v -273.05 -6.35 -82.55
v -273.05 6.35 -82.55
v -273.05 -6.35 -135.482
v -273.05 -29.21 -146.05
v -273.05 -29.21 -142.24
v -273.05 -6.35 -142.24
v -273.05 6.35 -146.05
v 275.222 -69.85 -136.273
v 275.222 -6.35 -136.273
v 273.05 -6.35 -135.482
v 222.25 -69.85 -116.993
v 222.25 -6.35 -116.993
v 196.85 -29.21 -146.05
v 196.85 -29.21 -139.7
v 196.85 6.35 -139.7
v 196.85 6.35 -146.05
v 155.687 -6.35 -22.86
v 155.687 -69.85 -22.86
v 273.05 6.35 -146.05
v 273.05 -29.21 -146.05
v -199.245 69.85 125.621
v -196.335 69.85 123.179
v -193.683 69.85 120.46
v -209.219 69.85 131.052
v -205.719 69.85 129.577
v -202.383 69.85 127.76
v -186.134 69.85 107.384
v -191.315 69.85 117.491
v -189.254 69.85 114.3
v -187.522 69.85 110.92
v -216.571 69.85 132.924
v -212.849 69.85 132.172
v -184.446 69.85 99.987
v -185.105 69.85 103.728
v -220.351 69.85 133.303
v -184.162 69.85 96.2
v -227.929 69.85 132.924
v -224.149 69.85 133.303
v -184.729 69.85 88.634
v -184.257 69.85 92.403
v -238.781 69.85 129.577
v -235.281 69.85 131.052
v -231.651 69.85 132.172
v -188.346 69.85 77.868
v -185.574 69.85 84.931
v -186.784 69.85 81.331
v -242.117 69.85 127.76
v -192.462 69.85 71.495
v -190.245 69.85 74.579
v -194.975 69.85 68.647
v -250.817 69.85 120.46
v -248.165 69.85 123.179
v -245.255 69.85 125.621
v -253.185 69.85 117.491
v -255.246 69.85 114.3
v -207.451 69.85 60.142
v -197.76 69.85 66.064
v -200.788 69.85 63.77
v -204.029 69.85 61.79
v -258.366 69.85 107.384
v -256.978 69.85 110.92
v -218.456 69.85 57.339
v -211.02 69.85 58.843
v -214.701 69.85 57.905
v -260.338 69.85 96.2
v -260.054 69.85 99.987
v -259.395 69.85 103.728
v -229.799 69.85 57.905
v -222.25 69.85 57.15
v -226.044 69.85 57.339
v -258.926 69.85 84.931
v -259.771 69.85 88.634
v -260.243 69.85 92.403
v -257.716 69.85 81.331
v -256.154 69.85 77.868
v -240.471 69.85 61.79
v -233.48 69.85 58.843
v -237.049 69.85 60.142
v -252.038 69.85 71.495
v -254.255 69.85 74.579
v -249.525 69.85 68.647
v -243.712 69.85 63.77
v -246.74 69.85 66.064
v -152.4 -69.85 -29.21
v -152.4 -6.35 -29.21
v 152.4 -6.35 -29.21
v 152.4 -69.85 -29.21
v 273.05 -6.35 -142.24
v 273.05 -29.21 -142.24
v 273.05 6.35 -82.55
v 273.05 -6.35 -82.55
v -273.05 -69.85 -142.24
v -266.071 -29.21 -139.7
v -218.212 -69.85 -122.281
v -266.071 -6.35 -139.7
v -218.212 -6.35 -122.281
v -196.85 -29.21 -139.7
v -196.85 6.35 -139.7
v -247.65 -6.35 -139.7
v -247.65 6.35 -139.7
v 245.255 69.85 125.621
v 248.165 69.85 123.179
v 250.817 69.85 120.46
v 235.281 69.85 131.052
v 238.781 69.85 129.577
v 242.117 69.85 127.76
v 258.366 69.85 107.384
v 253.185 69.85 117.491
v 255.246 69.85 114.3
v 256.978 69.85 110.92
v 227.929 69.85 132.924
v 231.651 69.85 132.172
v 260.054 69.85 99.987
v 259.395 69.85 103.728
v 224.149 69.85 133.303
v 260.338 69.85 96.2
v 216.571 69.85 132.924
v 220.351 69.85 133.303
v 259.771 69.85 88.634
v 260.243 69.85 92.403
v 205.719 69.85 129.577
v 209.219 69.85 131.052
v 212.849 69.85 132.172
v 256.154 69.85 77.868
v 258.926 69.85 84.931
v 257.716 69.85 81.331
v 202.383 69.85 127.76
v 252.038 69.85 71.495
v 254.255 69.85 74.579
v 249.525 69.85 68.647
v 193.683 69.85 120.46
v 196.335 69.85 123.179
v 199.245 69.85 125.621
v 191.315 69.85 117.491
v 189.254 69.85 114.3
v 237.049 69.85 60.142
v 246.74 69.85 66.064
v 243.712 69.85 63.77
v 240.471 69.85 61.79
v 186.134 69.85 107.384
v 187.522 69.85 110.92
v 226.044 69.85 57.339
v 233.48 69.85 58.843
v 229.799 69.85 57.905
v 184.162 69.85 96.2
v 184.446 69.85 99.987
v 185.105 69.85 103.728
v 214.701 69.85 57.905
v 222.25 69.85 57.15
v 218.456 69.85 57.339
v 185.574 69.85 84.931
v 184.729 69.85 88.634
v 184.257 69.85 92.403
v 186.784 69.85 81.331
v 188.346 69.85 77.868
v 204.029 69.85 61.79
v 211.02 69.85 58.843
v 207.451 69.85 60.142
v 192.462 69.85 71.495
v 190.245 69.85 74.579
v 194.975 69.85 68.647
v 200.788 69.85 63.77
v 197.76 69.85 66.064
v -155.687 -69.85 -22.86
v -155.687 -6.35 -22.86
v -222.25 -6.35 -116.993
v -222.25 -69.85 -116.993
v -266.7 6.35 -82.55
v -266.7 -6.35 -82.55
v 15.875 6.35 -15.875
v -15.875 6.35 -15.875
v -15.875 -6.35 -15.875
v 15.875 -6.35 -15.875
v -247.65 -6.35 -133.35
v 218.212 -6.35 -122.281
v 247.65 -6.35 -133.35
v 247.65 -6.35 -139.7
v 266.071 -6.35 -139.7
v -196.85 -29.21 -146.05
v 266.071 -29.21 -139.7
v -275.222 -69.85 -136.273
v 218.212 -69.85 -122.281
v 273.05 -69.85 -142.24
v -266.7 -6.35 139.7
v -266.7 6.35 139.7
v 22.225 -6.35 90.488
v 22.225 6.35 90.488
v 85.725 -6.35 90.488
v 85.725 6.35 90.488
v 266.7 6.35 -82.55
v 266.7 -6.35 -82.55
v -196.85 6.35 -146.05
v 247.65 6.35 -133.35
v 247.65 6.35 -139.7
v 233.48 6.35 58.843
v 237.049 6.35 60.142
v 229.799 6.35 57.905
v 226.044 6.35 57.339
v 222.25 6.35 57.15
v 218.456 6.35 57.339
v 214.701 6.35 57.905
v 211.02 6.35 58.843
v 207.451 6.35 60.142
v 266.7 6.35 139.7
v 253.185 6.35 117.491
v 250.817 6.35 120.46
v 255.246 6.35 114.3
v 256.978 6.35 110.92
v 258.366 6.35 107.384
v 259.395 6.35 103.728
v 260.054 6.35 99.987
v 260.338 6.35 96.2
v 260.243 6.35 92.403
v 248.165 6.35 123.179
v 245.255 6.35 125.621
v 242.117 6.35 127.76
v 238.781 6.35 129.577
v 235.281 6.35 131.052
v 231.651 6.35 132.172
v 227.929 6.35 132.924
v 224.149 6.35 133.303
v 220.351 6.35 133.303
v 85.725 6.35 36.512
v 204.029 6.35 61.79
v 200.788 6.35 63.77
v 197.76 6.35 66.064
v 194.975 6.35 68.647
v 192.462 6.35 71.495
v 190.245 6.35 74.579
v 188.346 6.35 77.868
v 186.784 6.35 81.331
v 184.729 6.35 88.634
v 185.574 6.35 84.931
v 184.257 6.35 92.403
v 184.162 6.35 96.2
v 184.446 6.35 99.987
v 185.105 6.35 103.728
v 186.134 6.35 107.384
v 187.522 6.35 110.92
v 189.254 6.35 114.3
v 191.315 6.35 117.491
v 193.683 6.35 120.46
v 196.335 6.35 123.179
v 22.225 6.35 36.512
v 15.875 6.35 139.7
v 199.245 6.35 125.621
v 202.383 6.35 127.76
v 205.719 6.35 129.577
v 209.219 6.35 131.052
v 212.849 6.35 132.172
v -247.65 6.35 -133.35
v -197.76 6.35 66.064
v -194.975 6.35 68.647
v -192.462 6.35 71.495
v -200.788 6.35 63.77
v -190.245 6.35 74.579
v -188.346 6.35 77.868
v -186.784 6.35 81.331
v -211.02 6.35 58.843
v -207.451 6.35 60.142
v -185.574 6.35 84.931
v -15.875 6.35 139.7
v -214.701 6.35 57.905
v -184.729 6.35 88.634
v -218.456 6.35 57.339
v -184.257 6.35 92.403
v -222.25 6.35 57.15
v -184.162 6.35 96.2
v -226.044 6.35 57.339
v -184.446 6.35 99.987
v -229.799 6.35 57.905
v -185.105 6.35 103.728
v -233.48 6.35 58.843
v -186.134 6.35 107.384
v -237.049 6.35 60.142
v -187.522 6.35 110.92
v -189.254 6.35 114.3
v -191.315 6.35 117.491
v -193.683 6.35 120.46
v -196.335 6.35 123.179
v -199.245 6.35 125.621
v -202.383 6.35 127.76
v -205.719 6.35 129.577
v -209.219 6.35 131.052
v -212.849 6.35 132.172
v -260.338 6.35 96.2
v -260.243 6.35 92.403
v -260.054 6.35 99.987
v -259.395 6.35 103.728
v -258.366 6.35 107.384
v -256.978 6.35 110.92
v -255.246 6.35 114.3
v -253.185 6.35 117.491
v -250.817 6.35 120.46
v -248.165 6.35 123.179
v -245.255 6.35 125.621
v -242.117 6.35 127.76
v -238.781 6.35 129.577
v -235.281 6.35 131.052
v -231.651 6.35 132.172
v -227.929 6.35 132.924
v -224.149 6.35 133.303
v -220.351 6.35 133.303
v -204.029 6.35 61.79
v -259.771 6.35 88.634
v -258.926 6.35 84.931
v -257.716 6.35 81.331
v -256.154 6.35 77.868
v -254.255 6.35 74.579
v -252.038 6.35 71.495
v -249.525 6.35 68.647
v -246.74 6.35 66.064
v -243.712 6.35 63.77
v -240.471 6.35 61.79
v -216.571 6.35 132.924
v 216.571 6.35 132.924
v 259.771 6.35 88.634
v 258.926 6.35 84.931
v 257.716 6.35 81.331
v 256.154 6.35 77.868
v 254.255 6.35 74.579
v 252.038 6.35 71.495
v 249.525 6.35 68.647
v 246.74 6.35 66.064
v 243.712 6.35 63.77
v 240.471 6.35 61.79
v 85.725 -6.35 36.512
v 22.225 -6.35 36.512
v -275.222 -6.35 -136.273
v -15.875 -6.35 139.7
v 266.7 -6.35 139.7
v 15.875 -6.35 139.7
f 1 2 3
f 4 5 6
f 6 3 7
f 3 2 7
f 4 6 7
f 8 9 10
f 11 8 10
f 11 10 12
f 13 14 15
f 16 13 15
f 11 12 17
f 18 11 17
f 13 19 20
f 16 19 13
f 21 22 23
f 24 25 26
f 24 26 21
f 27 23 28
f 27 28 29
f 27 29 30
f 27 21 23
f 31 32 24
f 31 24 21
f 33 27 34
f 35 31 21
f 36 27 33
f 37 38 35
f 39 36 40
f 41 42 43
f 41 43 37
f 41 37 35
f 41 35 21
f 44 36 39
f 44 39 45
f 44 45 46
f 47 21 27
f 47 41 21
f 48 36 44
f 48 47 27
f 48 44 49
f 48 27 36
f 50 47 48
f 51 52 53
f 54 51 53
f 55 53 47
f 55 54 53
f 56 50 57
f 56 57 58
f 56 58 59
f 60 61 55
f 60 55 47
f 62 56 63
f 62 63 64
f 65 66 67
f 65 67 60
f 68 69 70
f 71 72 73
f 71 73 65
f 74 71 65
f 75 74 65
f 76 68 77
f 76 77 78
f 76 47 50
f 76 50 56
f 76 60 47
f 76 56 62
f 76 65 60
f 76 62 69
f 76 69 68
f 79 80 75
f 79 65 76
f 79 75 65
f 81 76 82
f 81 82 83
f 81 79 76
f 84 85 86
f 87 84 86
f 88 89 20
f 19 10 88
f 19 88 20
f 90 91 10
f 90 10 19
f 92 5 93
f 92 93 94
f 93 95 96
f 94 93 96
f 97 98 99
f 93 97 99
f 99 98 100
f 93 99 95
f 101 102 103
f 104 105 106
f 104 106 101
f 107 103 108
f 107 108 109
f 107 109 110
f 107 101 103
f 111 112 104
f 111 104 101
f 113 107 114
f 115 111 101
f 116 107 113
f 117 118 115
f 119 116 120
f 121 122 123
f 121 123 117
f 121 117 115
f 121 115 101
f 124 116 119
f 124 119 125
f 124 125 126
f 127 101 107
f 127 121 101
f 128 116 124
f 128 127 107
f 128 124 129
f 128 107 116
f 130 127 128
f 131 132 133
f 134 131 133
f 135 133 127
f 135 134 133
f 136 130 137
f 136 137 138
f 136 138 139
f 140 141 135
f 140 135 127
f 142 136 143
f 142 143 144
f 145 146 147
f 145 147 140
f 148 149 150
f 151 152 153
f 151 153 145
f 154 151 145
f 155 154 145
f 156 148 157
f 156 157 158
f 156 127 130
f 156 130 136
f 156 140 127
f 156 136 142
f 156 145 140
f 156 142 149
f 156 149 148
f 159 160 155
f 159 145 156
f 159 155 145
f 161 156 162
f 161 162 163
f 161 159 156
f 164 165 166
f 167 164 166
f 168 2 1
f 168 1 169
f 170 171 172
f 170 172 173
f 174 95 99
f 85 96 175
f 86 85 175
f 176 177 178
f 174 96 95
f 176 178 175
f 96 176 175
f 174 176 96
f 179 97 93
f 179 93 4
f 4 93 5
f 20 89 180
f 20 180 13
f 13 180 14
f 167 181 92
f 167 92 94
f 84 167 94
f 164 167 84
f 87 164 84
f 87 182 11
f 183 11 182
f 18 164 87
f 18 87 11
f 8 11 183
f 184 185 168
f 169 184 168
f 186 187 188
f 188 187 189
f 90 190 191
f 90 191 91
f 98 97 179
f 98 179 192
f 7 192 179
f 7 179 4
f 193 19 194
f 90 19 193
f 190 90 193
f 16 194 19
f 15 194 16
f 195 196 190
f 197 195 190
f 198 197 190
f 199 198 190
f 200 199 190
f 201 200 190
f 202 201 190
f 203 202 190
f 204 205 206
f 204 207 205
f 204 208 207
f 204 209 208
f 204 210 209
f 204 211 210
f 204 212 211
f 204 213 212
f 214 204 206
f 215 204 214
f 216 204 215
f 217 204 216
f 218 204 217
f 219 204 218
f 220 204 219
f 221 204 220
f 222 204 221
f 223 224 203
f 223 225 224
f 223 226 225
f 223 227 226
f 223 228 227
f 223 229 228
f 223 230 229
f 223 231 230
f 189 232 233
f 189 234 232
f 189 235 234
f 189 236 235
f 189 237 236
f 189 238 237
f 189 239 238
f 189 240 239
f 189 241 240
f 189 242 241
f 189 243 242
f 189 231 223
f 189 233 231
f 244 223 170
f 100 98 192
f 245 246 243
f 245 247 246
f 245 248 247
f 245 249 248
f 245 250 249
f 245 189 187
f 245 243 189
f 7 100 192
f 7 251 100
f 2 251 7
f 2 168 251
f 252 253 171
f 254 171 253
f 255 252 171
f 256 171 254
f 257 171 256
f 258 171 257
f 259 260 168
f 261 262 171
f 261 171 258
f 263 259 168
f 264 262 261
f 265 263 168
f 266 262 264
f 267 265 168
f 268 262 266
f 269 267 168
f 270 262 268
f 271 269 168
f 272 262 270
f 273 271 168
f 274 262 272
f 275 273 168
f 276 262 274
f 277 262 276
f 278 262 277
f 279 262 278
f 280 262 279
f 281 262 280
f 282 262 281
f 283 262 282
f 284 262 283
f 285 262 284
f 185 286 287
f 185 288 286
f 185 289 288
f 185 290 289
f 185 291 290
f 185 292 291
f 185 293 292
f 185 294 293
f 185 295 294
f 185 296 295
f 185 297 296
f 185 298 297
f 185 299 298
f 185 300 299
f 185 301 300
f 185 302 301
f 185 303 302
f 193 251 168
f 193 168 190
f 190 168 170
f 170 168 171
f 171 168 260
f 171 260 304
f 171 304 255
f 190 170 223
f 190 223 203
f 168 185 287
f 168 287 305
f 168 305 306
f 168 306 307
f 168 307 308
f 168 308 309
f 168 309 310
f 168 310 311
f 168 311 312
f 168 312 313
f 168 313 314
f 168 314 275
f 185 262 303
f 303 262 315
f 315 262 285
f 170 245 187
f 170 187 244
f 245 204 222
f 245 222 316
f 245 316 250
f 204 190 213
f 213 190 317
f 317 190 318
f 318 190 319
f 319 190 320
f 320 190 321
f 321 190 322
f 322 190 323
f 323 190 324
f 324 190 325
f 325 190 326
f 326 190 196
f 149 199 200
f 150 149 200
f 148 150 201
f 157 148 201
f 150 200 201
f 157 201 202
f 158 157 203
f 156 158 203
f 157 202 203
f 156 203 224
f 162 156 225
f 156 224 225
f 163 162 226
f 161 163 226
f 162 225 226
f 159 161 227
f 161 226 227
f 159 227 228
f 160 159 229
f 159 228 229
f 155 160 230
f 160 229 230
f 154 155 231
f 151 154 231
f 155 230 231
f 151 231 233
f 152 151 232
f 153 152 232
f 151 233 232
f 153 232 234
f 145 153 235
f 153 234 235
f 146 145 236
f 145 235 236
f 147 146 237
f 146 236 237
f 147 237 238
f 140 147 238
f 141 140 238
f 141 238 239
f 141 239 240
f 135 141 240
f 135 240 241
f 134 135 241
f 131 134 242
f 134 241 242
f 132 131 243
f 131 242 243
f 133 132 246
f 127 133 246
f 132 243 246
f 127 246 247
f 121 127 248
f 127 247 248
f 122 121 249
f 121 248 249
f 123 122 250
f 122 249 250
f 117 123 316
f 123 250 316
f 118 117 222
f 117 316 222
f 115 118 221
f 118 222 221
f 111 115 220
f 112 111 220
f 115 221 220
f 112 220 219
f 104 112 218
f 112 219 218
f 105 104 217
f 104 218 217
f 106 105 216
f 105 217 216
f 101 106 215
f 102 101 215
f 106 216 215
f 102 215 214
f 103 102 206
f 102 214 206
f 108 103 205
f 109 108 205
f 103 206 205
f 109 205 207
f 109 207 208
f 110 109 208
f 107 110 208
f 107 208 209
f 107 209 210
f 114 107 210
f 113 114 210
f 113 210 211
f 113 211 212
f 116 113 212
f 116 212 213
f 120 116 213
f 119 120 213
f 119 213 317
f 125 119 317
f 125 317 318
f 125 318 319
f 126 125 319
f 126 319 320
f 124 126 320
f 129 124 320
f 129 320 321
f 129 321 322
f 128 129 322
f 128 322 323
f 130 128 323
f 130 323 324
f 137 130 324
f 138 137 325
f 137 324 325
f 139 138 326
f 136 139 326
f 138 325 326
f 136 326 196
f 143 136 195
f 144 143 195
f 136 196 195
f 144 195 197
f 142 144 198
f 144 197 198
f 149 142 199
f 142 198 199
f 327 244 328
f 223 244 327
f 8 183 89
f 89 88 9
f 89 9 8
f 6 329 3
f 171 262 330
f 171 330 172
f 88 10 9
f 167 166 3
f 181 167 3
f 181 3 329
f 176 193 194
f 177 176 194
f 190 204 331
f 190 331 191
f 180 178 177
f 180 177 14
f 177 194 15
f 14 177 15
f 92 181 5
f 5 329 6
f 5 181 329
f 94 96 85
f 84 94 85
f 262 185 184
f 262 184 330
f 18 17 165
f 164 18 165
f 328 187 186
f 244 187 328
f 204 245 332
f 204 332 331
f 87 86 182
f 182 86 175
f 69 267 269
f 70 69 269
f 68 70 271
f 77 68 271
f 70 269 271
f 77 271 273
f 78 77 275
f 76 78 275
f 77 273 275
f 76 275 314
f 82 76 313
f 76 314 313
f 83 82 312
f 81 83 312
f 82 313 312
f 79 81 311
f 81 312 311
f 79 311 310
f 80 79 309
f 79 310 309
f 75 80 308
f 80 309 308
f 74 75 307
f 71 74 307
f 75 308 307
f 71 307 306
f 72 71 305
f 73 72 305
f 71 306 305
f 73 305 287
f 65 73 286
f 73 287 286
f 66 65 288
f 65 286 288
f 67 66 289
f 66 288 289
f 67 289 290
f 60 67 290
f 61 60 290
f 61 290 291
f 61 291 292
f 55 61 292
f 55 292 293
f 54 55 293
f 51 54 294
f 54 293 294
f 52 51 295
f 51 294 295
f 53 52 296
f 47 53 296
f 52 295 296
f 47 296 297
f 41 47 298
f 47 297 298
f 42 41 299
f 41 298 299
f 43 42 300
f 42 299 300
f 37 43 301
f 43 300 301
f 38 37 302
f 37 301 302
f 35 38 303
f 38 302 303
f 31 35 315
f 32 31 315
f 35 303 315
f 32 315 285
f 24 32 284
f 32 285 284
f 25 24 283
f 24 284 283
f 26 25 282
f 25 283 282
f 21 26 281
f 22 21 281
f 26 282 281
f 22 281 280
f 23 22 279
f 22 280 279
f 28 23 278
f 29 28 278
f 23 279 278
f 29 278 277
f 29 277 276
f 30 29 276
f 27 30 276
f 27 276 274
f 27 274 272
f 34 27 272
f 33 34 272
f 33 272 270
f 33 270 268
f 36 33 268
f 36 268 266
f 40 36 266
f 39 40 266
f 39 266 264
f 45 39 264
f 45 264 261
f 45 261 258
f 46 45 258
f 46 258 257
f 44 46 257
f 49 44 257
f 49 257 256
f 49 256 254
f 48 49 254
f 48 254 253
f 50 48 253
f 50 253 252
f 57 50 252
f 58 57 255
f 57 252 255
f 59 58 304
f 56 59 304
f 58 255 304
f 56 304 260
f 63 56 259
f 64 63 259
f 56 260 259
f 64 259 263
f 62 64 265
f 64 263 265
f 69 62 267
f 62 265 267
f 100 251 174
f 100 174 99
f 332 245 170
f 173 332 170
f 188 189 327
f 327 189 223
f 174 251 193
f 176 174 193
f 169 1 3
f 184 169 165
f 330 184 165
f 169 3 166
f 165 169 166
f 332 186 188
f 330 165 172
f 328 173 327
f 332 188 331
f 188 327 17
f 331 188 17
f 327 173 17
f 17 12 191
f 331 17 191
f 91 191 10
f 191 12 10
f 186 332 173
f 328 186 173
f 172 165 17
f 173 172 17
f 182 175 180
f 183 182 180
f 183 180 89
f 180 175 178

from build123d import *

# Parameters (mm, degrees)
SKETCH1_W           = 546.1
SKETCH1_H           = 279.4
BOSS_EXTRUDE1_DEPTH = 6.35
SKETCH2_W           = 31.75
SKETCH2_H           = 155.575
SKETCH2_W_2         = 6.35
SKETCH2_H_2         = 222.25
SKETCH2_W_3         = 63.5
SKETCH2_H_3         = 53.975
SKETCH2_W_4         = 495.3
SKETCH2_H_4         = 6.35
CUT_EXTRUDE1_DEPTH  = 307.975051918
EXTRUDE2_DEPTH      = 63.5
SKETCH4_R           = 38.1
BOSS_EXTRUDE2_DEPTH = 63.5
SKETCH5_W           = 76.2
SKETCH5_H           = 35.56
BOSS_EXTRUDE3_DEPTH = 6.35


with BuildPart() as part:
    # Sketch1 → Boss-Extrude1 (new, symmetric)
    with BuildSketch(Plane(origin=(0, 0, 0), x_dir=(1, 0, 0), z_dir=(0, 1, 0))):
        Rectangle(SKETCH1_W, SKETCH1_H)
    extrude(amount=BOSS_EXTRUDE1_DEPTH, both=True)

    # Sketch2 → Cut-Extrude1 (cut, through all)
    with BuildSketch(Plane(origin=(0, 6.35, 0), x_dir=(1, 0, 0), z_dir=(0, 1, 0))):
        with Locations((0, -61.9125)):
            Rectangle(SKETCH2_W, SKETCH2_H)
        with Locations((-269.875, -28.575)):
            Rectangle(SKETCH2_W_2, SKETCH2_H_2)
        with Locations((53.975, -63.5)):
            Rectangle(SKETCH2_W_3, SKETCH2_H_3)
        with Locations((0, 136.525)):
            Rectangle(SKETCH2_W_4, SKETCH2_H_4)
        with Locations((269.875, -28.575)):
            Rectangle(SKETCH2_W_2, SKETCH2_H_2)
    extrude(amount=-CUT_EXTRUDE1_DEPTH, mode=Mode.SUBTRACT)

    # Sketch3 → Extrude2 (add)
    with BuildSketch(Plane.XZ.offset(6.35)):
        Polygon((222.25, -116.992783244), (155.686970507, -22.86), (-155.686970507, -22.86), (-222.25, -116.992783244), (-275.22182791, -136.272951858), (-273.05, -142.24), (-218.211919626, -122.28057104), (-152.4, -29.21), (152.4, -29.21), (218.211919626, -122.28057104), (273.05, -142.24), (275.22182791, -136.272951858), align=None)
    extrude(amount=EXTRUDE2_DEPTH)

    # Sketch4 → Boss-Extrude2 (add)
    with BuildSketch(Plane(origin=(0, 6.35, 0), x_dir=(1, 0, 0), z_dir=(0, 1, 0))):
        with Locations(Location((222.25, -95.25, 0), (0, 0, 90))):
            Circle(SKETCH4_R)
        with Locations(Location((-222.25, -95.25, 0), (0, 0, 90))):
            Circle(SKETCH4_R)
    extrude(amount=BOSS_EXTRUDE2_DEPTH)

    # Sketch5 → Boss-Extrude3 (add)
    with BuildSketch(Plane(origin=(0, 0, -139.7), x_dir=(-1, 0, 0), z_dir=(0, 0, -1))):
        with Locations((-234.95, -11.43)):
            Rectangle(SKETCH5_W, SKETCH5_H)
        with Locations((234.95, -11.43)):
            Rectangle(SKETCH5_W, SKETCH5_H)
    extrude(amount=BOSS_EXTRUDE3_DEPTH)


solid = part.part
